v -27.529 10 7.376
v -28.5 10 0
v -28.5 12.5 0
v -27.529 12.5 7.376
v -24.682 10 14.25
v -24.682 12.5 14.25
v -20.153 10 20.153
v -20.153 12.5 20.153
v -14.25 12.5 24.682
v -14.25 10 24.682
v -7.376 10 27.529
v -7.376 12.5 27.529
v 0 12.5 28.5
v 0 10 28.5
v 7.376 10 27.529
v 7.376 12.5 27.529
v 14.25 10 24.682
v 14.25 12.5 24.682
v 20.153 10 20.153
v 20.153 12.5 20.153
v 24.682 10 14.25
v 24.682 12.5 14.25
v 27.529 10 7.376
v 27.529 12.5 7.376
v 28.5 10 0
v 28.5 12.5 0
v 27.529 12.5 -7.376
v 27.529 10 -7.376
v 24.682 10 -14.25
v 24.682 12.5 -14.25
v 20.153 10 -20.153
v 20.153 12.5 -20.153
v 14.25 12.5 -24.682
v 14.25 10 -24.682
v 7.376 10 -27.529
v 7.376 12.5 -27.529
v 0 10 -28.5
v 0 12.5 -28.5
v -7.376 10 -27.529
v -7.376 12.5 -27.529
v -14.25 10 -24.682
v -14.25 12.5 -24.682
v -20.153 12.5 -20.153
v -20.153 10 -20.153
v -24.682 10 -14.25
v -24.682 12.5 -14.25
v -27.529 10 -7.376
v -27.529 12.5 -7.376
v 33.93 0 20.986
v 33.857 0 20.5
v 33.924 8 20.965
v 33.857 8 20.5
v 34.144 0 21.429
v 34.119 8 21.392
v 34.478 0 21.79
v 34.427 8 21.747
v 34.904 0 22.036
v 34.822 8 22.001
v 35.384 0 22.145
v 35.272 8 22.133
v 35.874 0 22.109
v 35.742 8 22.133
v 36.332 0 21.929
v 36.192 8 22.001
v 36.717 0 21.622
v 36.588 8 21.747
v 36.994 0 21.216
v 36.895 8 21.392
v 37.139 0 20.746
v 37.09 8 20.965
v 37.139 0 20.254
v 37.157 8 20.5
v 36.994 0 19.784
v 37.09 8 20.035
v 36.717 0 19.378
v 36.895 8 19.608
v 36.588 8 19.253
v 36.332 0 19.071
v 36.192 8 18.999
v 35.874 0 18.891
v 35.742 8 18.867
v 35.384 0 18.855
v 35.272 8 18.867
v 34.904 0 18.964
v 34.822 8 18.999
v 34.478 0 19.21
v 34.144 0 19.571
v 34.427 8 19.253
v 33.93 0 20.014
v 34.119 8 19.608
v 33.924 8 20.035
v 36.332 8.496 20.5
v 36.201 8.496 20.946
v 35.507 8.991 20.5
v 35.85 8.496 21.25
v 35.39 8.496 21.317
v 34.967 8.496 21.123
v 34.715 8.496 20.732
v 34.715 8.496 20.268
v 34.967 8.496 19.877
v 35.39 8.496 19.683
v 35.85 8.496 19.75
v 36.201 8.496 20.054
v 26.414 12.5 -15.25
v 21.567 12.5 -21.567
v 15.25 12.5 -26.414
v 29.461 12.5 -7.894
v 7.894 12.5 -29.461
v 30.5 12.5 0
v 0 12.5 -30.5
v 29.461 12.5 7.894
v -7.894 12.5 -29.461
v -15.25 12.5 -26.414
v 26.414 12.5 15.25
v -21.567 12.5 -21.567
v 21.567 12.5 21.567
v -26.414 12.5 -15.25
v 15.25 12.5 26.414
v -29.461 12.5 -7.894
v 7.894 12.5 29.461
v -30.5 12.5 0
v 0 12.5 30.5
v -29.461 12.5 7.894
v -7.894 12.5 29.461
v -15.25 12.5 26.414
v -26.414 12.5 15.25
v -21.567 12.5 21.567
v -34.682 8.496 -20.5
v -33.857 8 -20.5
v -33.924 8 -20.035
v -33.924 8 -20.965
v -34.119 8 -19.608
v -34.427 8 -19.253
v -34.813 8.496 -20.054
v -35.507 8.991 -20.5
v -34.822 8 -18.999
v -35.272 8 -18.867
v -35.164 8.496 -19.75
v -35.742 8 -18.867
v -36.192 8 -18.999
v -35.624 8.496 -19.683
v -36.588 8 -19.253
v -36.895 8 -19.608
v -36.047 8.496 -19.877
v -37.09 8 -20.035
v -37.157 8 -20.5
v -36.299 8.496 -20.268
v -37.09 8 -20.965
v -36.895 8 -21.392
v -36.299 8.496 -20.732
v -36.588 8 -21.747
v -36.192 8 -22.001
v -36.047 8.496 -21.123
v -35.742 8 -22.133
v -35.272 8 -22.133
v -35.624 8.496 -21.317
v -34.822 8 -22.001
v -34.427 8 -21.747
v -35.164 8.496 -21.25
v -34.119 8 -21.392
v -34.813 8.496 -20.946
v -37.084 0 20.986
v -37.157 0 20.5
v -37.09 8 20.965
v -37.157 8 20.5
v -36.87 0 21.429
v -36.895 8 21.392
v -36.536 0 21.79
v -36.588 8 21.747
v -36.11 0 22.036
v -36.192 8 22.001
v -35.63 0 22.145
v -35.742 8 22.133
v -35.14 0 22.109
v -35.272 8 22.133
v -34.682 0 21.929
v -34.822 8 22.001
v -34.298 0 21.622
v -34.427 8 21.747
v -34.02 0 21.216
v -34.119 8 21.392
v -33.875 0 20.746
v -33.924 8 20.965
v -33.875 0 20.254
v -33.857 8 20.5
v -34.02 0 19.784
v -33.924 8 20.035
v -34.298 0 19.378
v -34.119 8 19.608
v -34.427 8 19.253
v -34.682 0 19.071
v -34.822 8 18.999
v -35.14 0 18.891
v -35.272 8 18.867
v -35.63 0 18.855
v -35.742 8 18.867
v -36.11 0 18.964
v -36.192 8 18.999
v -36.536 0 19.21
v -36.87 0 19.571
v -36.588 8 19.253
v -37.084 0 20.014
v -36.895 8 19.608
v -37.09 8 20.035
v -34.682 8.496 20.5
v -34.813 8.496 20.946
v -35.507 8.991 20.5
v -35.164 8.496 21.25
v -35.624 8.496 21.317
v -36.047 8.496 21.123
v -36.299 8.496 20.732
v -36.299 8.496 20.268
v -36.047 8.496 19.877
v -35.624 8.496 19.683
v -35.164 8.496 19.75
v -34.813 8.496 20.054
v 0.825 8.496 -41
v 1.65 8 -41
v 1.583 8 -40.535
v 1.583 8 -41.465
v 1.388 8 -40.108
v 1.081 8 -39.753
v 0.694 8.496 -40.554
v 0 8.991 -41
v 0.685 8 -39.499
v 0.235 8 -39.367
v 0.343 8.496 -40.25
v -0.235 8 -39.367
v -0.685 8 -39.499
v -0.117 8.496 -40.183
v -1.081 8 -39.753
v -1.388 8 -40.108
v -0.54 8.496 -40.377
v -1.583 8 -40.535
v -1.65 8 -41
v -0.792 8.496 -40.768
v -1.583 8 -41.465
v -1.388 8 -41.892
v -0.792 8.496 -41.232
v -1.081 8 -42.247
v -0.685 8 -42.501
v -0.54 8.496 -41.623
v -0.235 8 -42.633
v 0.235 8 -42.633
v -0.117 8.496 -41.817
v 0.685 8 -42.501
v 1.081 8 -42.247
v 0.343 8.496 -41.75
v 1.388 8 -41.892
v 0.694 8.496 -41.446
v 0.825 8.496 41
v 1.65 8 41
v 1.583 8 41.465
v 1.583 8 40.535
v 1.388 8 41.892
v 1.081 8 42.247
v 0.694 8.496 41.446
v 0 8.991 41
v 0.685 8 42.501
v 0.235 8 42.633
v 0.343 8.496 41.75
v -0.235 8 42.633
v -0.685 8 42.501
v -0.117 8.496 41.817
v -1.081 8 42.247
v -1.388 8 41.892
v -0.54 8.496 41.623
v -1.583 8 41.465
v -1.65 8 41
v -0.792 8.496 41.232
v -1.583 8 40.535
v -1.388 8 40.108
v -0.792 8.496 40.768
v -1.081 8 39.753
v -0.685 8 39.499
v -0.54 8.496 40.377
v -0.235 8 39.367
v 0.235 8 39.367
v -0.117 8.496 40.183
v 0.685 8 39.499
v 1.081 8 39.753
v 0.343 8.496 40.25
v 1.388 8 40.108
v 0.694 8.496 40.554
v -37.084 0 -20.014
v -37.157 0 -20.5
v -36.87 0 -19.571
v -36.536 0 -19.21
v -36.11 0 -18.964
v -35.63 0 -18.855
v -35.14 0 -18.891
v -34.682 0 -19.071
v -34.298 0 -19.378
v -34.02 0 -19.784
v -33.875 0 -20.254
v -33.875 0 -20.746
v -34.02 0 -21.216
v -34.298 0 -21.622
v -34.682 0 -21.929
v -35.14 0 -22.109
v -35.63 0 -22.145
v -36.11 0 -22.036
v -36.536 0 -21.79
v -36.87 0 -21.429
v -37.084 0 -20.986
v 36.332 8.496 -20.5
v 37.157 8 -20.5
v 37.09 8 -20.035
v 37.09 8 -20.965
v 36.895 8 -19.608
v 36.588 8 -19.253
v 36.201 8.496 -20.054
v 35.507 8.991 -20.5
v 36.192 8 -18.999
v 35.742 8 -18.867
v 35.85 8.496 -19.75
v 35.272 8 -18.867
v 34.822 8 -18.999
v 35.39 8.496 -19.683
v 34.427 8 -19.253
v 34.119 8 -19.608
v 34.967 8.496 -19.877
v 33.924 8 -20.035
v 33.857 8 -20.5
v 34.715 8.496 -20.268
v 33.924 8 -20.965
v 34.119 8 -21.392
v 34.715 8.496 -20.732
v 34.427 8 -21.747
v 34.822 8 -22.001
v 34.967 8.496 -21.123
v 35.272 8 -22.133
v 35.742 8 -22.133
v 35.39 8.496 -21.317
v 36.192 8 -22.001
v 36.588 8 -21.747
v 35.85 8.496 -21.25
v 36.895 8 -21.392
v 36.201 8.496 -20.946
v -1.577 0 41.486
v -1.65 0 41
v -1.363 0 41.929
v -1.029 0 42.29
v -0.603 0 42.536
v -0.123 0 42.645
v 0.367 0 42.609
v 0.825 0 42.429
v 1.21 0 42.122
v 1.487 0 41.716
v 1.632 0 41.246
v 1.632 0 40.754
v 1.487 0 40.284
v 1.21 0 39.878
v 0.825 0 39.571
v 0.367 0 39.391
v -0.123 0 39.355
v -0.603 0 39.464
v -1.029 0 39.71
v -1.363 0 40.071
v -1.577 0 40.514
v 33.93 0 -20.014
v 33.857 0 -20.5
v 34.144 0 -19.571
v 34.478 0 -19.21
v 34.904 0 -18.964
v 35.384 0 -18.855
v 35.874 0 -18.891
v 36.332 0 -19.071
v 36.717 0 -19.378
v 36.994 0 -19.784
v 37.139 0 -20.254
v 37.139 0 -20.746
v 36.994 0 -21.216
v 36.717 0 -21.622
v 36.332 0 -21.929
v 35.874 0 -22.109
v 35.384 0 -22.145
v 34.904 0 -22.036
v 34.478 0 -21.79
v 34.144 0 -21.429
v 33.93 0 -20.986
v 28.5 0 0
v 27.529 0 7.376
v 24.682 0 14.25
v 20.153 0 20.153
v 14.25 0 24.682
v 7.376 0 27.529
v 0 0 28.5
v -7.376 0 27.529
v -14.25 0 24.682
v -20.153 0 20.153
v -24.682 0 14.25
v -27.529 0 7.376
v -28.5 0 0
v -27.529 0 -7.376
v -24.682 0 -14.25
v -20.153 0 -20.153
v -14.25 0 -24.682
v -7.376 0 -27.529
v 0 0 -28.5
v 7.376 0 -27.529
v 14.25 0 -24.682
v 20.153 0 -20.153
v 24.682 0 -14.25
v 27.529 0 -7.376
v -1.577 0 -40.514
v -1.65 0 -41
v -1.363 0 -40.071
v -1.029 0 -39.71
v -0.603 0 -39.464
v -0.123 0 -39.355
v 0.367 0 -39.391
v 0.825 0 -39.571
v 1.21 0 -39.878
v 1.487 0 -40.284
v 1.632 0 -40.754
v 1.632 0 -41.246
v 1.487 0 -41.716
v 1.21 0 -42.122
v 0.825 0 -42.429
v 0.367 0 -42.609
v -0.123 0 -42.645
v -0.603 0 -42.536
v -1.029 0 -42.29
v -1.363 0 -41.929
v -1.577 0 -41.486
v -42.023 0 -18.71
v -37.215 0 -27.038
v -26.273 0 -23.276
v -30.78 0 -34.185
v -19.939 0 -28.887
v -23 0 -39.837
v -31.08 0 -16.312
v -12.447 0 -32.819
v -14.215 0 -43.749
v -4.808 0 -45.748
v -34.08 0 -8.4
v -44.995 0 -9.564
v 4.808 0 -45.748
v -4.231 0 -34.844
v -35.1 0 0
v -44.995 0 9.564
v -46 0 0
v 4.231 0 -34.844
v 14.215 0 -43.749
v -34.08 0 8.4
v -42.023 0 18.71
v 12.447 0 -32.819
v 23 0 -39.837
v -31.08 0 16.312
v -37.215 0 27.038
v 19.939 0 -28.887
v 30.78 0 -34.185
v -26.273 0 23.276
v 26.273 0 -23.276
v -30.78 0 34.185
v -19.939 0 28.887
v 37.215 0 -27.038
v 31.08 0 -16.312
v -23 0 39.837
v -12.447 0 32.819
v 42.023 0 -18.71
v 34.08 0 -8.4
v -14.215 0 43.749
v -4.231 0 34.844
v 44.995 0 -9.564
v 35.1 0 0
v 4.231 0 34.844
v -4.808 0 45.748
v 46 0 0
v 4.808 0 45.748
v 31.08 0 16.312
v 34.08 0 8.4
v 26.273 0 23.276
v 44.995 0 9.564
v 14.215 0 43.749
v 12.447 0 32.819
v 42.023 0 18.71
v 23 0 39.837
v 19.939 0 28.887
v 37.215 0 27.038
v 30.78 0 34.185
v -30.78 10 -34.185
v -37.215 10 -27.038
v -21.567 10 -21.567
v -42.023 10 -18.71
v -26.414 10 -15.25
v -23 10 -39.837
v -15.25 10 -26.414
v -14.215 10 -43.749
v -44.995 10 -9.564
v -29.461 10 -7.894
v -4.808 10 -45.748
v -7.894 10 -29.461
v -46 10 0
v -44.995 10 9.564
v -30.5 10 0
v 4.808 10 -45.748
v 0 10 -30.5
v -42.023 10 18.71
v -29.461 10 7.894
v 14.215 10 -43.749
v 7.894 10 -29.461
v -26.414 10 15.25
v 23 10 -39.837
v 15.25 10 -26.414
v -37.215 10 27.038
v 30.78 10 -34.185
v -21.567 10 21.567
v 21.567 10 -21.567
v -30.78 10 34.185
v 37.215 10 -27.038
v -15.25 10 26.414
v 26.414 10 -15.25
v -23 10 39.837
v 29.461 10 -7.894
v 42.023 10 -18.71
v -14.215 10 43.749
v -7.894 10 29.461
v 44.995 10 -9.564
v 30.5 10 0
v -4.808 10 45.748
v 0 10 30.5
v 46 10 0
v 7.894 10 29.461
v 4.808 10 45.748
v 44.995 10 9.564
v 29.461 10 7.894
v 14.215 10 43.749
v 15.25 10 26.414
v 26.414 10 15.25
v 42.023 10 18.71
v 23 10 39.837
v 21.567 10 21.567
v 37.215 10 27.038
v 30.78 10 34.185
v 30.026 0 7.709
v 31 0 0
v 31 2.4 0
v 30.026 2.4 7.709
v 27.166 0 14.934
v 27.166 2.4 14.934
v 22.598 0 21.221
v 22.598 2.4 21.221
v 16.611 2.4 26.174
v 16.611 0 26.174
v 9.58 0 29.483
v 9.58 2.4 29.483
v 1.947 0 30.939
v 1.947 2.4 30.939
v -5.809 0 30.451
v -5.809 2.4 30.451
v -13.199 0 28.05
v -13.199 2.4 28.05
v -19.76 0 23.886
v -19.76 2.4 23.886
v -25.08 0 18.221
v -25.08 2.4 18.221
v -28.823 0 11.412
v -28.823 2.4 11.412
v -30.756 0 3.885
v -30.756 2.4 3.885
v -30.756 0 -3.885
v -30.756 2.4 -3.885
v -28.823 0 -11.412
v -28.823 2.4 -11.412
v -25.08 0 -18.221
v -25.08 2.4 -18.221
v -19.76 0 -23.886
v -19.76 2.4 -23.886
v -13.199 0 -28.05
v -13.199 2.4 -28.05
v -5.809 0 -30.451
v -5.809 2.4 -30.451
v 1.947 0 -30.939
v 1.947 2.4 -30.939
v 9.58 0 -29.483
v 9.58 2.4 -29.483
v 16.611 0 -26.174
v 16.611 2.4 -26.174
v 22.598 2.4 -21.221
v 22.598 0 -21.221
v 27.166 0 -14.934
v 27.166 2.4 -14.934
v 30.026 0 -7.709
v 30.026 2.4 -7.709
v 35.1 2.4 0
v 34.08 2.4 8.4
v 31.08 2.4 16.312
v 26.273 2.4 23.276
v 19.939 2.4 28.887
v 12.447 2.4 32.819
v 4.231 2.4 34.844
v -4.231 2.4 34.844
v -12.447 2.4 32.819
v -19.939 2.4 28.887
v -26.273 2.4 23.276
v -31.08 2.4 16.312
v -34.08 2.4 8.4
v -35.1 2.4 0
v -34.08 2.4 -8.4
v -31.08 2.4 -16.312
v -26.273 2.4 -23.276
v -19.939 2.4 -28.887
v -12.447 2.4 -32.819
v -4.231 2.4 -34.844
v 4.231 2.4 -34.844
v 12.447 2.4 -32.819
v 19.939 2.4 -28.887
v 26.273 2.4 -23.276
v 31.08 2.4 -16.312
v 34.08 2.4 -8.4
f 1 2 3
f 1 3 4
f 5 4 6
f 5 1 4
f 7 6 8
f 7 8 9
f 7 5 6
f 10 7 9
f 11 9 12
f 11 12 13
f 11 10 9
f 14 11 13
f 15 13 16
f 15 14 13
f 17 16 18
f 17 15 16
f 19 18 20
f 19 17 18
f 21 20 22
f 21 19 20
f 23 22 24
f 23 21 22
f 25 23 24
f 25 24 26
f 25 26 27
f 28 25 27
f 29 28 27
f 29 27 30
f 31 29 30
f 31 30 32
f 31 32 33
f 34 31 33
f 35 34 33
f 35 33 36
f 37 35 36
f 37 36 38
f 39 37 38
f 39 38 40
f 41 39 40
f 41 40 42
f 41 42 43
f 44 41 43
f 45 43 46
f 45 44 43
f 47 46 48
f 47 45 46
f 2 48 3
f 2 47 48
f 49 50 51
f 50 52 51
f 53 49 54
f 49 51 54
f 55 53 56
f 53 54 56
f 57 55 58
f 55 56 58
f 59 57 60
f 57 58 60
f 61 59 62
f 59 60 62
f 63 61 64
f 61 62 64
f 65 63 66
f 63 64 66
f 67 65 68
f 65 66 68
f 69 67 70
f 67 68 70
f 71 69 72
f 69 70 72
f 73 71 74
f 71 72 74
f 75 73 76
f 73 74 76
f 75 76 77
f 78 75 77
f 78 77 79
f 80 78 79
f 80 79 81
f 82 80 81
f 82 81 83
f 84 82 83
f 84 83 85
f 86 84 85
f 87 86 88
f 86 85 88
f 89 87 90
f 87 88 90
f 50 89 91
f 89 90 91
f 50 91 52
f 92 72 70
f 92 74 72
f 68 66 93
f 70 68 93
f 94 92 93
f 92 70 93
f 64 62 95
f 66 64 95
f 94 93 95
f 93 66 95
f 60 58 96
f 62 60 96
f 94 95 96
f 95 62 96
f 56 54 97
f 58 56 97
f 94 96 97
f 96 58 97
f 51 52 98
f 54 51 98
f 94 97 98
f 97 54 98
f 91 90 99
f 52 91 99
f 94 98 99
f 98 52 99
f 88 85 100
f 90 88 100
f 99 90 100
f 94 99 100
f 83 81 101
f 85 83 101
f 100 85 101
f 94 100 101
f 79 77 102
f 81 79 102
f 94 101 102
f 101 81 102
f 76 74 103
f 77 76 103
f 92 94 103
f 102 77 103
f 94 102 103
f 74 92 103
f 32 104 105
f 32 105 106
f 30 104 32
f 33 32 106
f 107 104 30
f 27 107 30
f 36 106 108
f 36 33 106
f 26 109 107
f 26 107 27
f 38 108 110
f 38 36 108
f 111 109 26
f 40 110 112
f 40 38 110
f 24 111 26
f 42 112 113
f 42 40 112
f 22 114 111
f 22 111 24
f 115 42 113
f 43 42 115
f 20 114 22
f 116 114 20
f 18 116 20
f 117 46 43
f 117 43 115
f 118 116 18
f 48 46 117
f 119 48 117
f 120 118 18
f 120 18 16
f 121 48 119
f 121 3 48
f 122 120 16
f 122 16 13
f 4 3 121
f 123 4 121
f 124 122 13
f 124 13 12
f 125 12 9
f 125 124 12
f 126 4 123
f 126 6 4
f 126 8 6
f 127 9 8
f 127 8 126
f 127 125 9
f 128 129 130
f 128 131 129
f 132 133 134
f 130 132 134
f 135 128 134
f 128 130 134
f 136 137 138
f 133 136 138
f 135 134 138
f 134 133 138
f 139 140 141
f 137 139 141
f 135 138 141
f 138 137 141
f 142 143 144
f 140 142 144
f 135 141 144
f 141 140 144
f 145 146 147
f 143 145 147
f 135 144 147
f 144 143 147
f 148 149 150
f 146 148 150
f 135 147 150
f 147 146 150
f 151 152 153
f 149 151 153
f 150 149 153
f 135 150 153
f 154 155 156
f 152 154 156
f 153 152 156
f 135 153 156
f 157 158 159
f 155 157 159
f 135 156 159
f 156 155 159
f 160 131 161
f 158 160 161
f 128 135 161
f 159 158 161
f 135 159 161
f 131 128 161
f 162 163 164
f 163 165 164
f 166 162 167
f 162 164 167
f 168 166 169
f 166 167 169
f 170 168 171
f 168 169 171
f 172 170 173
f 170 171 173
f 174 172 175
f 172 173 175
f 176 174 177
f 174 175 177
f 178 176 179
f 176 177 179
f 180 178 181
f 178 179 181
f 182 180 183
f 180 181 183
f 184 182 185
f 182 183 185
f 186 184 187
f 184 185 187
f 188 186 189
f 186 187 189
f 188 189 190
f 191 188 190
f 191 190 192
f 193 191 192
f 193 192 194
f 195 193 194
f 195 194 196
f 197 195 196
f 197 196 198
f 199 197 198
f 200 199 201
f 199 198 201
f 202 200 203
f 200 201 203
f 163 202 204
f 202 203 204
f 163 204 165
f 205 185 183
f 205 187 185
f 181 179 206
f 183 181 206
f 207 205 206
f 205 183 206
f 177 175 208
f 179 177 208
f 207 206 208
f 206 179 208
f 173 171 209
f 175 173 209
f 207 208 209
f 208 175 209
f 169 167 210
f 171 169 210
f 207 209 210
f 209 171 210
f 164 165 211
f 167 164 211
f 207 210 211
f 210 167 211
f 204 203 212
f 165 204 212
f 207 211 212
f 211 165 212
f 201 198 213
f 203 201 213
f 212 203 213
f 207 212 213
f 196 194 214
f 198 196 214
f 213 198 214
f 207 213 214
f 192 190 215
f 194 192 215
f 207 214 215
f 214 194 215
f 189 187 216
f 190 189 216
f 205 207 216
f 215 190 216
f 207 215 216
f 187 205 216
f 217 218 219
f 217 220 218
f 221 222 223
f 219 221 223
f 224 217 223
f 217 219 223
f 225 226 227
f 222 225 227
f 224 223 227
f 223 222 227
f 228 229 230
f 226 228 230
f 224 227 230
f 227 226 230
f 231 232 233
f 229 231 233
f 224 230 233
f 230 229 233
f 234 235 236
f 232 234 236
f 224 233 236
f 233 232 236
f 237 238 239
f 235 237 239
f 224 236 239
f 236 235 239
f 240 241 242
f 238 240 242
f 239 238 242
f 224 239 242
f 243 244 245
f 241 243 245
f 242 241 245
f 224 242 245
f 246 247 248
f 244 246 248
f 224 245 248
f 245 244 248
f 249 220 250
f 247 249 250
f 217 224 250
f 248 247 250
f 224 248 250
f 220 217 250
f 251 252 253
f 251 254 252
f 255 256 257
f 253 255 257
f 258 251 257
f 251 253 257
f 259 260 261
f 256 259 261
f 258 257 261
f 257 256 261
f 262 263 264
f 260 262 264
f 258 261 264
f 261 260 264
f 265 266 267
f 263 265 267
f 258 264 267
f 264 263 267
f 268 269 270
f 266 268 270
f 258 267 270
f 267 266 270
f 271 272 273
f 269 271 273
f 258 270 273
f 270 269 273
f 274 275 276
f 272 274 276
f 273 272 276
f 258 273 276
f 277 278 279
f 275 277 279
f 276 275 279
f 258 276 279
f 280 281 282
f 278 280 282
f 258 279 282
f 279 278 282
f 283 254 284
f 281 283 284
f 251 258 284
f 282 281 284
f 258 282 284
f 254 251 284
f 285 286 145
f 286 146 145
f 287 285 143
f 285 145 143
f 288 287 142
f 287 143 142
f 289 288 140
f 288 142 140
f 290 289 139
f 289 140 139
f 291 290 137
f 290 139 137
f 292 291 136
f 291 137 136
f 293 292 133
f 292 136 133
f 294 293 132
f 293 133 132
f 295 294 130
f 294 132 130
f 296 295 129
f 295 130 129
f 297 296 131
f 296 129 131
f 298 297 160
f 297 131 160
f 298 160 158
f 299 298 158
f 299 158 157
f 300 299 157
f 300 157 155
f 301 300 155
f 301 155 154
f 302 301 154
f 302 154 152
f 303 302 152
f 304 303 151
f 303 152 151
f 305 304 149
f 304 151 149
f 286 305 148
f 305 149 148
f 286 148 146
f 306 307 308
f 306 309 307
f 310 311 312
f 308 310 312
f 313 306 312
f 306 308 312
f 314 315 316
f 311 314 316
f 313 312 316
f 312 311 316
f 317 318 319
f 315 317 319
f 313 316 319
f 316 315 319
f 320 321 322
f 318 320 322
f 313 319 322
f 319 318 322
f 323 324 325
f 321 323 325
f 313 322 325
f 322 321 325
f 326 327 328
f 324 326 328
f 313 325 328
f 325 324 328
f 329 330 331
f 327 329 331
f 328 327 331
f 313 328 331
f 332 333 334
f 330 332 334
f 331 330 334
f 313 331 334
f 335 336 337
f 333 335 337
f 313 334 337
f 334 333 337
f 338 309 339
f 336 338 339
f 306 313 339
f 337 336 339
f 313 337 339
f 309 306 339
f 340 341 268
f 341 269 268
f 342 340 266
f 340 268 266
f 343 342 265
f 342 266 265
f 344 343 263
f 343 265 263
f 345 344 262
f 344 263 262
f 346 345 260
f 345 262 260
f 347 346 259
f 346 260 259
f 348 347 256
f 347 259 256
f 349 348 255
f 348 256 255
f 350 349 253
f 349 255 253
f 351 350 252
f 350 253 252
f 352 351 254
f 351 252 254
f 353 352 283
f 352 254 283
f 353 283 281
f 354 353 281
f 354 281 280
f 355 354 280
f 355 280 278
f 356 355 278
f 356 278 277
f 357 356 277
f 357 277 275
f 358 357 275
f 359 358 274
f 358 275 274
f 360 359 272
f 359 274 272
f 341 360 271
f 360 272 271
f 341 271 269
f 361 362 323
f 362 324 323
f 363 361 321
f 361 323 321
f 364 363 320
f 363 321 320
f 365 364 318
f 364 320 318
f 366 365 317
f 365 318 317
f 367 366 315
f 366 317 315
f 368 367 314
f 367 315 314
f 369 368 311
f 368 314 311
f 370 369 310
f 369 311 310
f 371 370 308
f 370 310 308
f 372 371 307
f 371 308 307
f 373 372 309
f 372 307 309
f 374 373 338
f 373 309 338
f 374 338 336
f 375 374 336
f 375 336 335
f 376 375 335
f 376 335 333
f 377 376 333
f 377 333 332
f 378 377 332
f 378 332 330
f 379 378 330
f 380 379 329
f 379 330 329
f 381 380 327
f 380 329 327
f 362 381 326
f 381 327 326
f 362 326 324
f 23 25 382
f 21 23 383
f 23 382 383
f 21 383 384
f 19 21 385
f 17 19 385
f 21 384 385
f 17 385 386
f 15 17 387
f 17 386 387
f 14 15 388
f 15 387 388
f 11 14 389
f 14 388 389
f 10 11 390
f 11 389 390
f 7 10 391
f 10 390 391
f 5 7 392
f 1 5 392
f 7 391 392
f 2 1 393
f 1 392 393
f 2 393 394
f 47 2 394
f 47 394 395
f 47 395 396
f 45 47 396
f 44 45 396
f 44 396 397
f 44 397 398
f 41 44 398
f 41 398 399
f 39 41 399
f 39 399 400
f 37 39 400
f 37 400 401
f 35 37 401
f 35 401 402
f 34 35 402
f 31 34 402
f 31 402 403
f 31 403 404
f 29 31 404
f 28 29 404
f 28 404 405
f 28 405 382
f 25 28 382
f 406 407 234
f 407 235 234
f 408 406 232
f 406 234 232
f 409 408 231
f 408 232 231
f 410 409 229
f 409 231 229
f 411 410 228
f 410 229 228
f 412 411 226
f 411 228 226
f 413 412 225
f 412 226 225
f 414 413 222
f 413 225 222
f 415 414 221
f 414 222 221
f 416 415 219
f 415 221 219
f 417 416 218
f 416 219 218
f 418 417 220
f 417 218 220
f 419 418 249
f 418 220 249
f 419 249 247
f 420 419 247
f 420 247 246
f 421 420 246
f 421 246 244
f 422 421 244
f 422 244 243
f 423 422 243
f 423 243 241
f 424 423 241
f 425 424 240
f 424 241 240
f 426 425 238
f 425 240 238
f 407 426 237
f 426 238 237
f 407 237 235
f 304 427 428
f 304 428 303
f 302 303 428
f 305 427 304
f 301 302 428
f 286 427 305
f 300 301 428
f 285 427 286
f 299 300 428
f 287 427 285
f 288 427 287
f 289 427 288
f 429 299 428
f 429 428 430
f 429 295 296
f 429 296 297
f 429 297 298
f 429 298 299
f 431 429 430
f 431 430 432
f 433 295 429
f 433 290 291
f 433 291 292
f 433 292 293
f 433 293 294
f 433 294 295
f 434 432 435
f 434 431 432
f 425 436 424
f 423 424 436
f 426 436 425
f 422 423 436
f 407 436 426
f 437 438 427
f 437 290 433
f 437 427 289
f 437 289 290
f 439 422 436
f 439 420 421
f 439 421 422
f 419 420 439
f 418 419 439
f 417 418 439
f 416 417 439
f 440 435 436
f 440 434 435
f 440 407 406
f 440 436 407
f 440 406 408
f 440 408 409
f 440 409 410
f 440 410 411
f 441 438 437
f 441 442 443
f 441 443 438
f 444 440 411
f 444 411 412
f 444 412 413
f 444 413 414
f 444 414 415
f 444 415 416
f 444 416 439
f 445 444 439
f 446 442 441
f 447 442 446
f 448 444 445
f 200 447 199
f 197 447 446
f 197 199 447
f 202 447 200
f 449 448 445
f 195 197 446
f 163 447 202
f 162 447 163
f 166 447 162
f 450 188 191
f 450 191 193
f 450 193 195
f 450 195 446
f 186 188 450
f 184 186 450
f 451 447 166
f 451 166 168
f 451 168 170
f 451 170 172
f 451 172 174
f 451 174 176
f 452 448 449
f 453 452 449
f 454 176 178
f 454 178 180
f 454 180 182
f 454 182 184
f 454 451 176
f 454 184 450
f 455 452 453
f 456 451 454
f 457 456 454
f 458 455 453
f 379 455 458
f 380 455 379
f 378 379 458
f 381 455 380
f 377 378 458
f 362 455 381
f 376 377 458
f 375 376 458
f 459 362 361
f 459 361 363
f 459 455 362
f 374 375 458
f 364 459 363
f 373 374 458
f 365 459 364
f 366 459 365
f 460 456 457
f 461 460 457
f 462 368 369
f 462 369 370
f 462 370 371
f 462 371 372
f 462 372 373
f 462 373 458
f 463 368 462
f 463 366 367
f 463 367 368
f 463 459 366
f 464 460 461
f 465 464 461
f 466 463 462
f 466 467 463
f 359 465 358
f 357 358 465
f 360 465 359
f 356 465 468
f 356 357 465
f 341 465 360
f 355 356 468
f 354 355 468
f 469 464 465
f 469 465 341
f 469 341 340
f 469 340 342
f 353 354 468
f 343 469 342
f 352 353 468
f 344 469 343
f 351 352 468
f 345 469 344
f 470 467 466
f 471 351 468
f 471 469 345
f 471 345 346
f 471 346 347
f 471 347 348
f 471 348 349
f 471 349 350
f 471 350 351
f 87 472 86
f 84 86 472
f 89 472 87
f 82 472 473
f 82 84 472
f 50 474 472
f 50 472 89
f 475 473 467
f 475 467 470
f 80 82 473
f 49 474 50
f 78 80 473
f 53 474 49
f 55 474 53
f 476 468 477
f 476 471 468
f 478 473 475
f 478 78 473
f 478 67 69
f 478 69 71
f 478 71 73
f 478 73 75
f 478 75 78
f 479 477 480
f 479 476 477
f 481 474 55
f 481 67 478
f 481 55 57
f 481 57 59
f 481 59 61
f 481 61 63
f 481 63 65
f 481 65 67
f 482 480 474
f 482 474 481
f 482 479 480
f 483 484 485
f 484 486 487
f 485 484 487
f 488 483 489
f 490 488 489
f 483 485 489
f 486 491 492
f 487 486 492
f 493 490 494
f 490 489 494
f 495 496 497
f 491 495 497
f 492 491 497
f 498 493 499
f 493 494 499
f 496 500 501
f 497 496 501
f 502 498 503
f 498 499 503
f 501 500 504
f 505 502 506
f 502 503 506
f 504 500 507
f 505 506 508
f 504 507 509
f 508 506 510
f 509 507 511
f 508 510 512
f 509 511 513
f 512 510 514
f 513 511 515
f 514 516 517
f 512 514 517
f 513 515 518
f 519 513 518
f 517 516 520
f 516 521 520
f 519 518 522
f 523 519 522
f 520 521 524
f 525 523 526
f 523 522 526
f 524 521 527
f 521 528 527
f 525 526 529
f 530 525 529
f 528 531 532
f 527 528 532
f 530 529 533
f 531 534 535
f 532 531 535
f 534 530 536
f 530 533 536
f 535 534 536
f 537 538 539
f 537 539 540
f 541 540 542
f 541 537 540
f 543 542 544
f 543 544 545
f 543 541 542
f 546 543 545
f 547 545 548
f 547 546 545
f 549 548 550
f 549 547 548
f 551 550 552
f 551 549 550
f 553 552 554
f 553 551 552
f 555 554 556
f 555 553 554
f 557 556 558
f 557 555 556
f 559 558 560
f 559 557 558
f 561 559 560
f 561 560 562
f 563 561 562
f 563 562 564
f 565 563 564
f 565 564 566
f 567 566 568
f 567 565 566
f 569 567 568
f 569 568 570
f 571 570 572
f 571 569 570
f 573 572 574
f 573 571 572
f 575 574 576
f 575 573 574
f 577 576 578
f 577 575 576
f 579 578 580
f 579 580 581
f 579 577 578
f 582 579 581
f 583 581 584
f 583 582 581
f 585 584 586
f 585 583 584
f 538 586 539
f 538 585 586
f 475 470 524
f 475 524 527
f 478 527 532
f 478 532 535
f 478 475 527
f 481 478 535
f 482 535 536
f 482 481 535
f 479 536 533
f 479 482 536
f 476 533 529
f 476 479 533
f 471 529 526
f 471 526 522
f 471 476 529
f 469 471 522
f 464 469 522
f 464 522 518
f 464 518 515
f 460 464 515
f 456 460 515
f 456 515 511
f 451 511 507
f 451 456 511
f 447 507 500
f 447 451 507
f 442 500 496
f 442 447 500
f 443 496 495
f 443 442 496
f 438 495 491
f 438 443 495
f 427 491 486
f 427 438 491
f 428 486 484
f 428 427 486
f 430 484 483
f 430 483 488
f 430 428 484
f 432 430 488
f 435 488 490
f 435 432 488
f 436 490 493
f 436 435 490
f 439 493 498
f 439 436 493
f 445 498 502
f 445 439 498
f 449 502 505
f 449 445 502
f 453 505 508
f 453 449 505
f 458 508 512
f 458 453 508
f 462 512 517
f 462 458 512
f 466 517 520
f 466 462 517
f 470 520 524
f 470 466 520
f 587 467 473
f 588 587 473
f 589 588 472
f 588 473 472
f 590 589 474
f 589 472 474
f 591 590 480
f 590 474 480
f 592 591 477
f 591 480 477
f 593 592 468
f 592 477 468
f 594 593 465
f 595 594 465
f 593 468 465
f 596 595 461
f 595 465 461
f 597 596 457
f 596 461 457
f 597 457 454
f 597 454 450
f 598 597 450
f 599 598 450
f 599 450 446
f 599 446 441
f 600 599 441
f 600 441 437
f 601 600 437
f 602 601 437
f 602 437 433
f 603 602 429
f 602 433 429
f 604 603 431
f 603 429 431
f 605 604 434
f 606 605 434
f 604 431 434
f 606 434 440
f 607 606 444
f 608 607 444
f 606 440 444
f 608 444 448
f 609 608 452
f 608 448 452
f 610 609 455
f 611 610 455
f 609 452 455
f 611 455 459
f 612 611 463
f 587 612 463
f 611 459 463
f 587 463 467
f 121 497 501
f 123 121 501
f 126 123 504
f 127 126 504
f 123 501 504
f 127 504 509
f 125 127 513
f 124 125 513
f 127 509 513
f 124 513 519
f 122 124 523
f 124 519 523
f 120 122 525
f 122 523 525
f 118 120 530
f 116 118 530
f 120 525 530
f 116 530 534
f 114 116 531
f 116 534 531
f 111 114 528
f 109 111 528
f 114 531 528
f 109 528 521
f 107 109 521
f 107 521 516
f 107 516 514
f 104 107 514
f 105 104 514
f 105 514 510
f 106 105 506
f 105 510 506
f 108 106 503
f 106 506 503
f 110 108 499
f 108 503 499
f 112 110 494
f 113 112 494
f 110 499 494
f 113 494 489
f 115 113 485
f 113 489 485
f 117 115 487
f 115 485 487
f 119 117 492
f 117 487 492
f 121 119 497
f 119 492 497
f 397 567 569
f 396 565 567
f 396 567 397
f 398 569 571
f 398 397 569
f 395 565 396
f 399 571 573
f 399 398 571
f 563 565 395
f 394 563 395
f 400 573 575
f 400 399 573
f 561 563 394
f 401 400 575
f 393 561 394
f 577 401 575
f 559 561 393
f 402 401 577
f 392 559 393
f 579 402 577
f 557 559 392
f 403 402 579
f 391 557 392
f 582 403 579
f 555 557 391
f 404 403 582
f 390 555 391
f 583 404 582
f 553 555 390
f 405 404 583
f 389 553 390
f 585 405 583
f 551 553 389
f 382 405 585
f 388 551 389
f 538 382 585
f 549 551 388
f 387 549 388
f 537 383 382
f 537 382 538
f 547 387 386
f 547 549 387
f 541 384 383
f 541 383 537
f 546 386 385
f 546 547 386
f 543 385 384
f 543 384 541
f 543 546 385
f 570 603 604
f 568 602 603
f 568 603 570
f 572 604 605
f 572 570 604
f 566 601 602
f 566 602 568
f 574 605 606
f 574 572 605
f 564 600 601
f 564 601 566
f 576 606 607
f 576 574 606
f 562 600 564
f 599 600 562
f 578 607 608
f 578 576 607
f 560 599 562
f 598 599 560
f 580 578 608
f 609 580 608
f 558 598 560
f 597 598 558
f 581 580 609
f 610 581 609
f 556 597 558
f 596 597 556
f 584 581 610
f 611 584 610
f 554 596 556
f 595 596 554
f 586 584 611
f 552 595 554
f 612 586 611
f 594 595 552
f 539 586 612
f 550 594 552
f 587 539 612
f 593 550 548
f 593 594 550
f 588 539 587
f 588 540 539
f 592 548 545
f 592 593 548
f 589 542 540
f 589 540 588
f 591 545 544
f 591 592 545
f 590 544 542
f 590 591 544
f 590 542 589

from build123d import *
from build123d import SkipClean  # not in build123d's __all__

# Parameters (mm, degrees)
F0_R     = 46
F0_R_2   = 28.5
F1_DEPTH = 10
F2_R     = 35.1
F2_R_2   = 31
F3_DEPTH = 2.4
F5_D     = 3.3
F5_DEPTH = 8
F5_TIP   = 0.9914200214
F6_R     = 30.5
F6_R_2   = 28.5
F7_DEPTH = 2.5


with BuildPart() as f1:
    # F0 (on Front) → F1 (new body)
    with BuildSketch(Plane.XZ):
        Circle(F0_R)
        Circle(F0_R_2, mode=Mode.SUBTRACT)
    extrude(amount=-F1_DEPTH)

    # F2 (on face) → F3 (cut)
    with BuildSketch(Plane.XZ):
        Circle(F2_R)
        Circle(F2_R_2, mode=Mode.SUBTRACT)
    extrude(amount=-F3_DEPTH, mode=Mode.SUBTRACT)

    # F5
    with Locations(Plane.XZ):
        with Locations((0, 41), (35.5070415552, 20.5), (35.5070415552, -20.5), (0, -41), (-35.5070415552, -20.5), (-35.5070415552, 20.5)):
            Hole(F5_D / 2, depth=F5_DEPTH)
            with Locations((0, 0, -(F5_DEPTH + F5_TIP / 2))):  # 118° drill point
                Cone(0, F5_D / 2, F5_TIP, mode=Mode.SUBTRACT)

    # F6 (on face) → F7 (join)
    with BuildSketch(Plane(origin=(0, 10, 0), x_dir=(-1, 0, 0), z_dir=(0, 1, 0))):
        Circle(F6_R)
        Circle(F6_R_2, mode=Mode.SUBTRACT)
    with SkipClean():  # cleaning this boolean's faces spoils the solid; the shape is the same uncleaned
        extrude(amount=F7_DEPTH)


solid = f1.part
